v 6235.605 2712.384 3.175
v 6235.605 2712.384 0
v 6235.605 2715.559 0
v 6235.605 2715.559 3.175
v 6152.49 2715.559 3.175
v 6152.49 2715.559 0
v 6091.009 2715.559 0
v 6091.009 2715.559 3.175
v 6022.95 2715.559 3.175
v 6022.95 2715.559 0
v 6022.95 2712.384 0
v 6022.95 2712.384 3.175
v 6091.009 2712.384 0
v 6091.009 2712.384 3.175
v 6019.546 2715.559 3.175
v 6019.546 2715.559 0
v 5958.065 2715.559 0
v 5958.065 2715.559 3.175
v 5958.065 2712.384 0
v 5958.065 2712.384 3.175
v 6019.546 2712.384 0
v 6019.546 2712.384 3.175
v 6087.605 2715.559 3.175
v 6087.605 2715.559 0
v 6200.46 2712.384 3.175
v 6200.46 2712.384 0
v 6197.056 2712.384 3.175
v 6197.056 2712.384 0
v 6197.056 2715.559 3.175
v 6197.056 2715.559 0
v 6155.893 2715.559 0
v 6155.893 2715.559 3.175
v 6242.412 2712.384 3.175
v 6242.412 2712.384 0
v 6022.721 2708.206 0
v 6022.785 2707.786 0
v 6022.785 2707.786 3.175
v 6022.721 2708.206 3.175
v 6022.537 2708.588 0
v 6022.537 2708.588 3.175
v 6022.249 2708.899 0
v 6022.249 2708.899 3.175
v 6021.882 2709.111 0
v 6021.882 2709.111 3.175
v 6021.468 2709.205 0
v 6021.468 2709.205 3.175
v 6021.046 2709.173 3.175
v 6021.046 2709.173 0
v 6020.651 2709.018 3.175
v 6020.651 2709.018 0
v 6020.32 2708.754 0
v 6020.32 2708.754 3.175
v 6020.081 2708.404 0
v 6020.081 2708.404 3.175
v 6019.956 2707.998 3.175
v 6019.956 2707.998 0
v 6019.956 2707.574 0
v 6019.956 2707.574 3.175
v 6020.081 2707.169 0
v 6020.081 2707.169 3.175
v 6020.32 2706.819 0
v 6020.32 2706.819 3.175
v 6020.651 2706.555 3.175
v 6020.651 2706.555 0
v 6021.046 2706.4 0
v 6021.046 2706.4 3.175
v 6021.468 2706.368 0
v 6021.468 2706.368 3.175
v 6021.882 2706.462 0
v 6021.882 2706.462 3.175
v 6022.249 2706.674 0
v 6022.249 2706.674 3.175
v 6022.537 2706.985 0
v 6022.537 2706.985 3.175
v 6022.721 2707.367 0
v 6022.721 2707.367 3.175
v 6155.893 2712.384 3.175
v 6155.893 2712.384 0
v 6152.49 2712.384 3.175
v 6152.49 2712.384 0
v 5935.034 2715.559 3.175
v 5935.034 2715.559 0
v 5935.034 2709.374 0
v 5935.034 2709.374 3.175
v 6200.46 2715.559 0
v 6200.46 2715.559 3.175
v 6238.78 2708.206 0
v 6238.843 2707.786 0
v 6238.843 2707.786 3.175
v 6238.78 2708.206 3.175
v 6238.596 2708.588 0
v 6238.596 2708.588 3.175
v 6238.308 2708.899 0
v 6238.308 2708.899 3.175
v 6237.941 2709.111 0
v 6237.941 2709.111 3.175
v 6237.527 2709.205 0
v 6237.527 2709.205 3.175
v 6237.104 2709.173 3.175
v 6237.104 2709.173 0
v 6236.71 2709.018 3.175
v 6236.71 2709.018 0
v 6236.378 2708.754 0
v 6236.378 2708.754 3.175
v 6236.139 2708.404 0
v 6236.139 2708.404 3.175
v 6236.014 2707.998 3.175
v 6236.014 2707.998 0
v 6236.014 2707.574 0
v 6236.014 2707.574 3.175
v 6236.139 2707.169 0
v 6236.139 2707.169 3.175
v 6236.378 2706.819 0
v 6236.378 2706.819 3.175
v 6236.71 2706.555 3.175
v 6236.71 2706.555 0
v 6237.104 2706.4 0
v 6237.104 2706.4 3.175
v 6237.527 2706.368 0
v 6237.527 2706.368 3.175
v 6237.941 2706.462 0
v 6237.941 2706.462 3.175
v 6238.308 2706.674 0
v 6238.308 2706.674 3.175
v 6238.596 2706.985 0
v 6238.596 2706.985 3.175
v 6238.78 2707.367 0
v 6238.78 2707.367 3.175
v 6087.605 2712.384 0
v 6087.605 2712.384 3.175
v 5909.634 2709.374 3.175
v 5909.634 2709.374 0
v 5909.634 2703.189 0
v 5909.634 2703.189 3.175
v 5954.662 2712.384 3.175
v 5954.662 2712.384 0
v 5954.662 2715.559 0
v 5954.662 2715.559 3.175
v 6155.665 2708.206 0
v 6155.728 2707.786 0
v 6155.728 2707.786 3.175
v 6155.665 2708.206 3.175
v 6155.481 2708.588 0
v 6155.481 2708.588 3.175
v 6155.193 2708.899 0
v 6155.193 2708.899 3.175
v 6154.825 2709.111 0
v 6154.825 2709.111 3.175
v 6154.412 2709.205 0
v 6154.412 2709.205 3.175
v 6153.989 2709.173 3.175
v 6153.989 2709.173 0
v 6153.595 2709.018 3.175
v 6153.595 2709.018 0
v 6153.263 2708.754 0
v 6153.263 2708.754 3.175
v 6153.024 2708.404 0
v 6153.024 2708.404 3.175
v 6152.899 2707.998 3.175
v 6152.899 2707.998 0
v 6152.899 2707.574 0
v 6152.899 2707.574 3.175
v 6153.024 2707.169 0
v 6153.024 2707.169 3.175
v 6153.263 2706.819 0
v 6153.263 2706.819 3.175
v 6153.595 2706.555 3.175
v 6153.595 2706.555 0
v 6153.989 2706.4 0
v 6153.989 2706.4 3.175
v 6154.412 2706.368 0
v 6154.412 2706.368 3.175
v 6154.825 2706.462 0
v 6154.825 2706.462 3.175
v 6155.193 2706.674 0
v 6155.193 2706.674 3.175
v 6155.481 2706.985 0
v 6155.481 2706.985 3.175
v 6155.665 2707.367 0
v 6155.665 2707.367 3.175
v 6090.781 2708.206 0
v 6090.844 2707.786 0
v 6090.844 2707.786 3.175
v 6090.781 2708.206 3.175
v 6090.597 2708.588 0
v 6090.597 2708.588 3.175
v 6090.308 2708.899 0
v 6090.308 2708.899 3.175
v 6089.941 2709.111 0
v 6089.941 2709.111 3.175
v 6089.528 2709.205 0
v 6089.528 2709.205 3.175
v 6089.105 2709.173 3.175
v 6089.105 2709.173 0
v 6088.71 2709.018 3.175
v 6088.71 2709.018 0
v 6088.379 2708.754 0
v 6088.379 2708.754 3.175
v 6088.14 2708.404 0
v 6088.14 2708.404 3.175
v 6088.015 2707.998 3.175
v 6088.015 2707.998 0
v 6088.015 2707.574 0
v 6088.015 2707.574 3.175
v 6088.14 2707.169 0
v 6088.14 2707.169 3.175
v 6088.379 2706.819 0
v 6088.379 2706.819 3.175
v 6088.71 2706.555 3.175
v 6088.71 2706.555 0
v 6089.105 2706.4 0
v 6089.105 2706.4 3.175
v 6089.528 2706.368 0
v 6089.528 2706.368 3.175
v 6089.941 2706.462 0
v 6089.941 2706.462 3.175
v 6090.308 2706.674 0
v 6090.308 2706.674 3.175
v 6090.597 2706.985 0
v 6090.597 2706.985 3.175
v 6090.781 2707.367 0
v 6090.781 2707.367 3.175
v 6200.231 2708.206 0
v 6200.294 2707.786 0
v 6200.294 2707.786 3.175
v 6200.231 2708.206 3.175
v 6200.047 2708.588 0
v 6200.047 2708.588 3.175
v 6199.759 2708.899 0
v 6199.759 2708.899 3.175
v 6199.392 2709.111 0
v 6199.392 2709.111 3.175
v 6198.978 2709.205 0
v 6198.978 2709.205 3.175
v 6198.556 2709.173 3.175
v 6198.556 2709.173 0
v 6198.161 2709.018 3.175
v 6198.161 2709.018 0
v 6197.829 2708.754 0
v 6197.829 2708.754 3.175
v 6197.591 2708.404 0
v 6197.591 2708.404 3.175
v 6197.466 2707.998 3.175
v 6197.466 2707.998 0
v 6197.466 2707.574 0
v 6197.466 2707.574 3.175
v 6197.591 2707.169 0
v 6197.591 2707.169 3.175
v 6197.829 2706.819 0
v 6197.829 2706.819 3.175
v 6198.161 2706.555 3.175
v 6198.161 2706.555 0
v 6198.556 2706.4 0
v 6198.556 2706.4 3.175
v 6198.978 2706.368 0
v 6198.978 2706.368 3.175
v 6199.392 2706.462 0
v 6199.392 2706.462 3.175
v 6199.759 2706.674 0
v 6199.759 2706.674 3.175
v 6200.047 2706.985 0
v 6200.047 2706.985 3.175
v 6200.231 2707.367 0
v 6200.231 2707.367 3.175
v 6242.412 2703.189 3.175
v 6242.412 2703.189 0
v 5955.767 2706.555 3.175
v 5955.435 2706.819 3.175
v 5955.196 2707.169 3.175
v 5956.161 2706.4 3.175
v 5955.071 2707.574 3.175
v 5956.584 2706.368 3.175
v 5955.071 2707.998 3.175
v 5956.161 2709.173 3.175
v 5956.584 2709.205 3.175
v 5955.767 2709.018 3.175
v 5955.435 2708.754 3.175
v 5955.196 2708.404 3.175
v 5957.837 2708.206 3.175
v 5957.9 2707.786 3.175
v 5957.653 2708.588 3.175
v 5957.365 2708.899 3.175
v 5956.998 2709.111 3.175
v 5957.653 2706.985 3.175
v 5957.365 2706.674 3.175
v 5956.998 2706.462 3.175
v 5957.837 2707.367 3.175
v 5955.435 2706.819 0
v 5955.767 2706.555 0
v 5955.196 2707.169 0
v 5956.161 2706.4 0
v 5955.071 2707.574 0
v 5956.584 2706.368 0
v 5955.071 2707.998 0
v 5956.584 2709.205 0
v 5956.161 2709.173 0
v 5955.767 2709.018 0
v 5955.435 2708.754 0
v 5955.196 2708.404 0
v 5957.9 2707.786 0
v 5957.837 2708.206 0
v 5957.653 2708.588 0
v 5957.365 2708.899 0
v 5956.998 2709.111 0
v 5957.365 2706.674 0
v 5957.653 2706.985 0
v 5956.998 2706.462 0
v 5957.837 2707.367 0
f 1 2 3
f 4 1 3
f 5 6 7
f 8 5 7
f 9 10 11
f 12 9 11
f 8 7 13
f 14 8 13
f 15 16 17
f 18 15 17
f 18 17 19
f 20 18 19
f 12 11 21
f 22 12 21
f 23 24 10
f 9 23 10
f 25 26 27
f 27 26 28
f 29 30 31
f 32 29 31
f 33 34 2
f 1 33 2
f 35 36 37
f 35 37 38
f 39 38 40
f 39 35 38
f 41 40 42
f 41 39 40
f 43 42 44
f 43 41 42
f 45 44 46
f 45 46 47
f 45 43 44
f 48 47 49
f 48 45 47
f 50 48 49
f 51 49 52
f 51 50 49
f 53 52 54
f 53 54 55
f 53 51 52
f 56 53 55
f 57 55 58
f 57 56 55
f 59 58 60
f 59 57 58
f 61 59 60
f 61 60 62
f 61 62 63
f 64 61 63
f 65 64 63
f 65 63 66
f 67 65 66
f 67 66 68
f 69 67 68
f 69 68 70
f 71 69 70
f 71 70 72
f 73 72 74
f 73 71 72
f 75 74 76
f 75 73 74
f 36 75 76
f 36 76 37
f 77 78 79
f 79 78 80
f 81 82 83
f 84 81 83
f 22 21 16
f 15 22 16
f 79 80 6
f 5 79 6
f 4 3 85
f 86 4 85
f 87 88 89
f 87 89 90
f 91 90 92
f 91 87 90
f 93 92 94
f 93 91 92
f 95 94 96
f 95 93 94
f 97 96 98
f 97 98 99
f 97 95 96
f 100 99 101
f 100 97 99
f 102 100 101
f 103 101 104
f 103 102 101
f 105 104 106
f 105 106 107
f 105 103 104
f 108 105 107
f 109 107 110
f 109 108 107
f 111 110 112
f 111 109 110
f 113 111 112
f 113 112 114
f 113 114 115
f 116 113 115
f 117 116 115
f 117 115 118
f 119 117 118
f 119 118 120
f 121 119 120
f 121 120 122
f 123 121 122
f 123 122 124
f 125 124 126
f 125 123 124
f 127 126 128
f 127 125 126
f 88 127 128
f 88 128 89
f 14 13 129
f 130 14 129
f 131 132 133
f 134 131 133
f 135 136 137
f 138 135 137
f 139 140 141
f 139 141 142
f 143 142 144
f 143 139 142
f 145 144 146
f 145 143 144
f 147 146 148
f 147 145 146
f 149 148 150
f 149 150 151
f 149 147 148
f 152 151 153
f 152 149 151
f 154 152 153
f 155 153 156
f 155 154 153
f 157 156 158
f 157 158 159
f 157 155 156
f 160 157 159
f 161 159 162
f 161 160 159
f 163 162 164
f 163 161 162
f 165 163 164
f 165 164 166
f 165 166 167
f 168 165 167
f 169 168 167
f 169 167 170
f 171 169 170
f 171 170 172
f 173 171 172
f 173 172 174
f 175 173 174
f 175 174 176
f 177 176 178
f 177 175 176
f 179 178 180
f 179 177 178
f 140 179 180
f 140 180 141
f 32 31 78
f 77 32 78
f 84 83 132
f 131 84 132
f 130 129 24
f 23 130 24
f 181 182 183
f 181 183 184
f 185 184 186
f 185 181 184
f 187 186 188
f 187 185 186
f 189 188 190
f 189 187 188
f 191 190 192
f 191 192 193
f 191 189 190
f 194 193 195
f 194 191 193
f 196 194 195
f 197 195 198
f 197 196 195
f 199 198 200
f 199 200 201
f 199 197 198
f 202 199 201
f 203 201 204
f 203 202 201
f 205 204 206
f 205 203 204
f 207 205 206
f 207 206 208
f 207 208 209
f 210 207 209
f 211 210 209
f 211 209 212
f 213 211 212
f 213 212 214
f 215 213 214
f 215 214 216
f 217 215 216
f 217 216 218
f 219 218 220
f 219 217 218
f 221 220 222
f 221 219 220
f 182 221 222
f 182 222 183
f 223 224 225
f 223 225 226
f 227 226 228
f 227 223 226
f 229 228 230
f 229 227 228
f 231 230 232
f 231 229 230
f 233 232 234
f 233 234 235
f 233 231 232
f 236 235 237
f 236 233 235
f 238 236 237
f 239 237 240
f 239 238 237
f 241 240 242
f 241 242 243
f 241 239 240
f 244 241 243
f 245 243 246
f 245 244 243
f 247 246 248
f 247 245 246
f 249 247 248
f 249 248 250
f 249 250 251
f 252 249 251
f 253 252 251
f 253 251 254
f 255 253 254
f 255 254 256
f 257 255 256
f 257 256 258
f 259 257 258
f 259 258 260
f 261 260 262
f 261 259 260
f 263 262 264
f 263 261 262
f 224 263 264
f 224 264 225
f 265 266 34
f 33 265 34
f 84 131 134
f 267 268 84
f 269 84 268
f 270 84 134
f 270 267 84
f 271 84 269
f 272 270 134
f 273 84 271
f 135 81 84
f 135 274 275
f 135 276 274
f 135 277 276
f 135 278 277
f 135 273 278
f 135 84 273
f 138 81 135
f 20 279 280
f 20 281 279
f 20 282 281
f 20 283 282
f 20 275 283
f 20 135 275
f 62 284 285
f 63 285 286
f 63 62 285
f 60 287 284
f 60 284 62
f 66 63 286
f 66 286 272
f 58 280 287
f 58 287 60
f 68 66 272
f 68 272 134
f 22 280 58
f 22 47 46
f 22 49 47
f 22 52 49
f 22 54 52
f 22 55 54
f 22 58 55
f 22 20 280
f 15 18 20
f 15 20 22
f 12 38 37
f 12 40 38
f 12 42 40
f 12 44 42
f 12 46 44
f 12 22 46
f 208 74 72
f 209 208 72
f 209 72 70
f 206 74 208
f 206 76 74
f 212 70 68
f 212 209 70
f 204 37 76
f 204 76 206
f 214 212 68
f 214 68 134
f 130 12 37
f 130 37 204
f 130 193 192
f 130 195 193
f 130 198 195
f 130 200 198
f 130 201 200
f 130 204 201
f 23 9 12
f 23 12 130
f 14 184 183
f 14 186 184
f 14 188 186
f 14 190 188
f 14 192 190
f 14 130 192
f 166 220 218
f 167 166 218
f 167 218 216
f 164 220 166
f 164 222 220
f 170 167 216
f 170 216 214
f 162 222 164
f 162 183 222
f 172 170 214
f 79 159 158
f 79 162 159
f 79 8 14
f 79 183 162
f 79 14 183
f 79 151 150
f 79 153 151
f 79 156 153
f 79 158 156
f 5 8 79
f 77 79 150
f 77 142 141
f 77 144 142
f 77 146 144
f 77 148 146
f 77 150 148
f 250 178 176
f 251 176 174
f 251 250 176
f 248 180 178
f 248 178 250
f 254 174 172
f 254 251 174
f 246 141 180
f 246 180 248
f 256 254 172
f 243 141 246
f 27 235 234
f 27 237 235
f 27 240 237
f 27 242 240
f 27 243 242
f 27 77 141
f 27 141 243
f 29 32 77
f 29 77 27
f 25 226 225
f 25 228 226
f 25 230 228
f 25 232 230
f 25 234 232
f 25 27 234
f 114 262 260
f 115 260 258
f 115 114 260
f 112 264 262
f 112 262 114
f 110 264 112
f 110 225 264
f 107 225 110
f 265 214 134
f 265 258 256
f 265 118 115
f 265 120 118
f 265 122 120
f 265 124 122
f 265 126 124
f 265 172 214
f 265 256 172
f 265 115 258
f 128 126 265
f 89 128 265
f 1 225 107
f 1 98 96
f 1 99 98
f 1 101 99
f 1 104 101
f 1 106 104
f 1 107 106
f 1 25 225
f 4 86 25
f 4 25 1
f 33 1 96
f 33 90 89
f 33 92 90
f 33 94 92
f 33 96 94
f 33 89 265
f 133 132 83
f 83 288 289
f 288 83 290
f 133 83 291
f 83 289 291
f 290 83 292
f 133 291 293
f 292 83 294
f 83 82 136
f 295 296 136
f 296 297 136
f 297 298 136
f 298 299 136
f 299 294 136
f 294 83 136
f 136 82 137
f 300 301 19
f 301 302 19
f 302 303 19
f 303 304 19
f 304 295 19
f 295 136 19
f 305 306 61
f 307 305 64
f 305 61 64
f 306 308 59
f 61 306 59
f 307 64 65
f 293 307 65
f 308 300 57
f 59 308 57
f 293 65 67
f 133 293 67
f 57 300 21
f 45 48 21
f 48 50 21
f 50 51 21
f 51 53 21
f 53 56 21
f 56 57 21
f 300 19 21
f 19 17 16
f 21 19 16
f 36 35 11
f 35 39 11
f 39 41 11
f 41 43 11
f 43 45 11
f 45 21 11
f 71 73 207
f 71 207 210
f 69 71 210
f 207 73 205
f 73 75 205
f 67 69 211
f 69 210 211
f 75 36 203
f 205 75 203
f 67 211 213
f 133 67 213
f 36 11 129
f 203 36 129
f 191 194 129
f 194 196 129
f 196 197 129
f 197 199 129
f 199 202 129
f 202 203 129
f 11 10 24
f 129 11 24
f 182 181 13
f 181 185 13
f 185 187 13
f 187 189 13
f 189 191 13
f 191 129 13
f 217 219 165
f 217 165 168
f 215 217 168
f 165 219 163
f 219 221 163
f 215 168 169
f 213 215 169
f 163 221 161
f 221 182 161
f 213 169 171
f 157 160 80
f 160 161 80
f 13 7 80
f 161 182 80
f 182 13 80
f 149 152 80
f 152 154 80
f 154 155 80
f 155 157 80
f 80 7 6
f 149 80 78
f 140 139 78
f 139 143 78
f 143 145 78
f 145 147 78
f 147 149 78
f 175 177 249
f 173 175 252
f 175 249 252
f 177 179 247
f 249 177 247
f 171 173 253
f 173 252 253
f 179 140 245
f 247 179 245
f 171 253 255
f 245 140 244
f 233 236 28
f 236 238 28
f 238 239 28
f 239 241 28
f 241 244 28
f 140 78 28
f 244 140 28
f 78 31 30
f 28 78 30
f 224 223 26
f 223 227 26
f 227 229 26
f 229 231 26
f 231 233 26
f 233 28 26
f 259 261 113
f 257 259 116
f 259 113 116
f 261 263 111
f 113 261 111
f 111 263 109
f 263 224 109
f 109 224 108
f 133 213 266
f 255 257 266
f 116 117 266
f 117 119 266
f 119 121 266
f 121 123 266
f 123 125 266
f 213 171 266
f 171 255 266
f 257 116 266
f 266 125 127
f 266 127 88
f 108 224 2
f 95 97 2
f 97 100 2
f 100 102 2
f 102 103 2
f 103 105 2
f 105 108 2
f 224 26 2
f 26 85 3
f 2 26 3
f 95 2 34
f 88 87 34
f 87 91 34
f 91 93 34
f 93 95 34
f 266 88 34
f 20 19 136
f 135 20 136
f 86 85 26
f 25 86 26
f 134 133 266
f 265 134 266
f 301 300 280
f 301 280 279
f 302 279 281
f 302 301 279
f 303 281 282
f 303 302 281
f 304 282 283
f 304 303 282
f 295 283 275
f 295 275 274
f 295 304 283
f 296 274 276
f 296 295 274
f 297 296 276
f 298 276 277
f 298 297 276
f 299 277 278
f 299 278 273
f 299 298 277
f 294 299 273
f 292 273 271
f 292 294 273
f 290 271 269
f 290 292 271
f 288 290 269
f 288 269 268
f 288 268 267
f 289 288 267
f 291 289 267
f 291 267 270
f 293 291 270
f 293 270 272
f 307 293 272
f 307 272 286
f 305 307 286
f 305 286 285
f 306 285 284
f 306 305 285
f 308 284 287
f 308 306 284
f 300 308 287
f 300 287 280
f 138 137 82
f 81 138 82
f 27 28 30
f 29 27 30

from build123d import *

# Parameters (mm, degrees)
SKETCH1_R           = 1.4224
BOSS_EXTRUDE1_DEPTH = 3.175


with BuildPart() as part:
    # Sketch1 → Boss-Extrude1 (new body)
    with BuildSketch(Plane.XY):
        Polygon((6235.604848961, 2712.383832202), (6235.604848961, 2715.558832202), (6200.459551877, 2715.558832202), (6200.459551877, 2712.383832202), (6197.055951877, 2712.383832202), (6197.055951877, 2715.558832202), (6155.893298961, 2715.558832202), (6155.893298961, 2712.383832202), (6152.489698961, 2712.383832202), (6152.489698961, 2715.558832202), (6091.008998961, 2715.558832202), (6091.008998961, 2712.383832202), (6087.605398961, 2712.383832202), (6087.605398961, 2715.558832202), (6022.949698961, 2715.558832202), (6022.949698961, 2712.383832202), (6019.546098961, 2712.383832202), (6019.546098961, 2715.558832202), (5958.065398961, 2715.558832202), (5958.065398961, 2712.383832202), (5954.661798961, 2712.383832202), (5954.661798961, 2715.558832202), (5935.033948961, 2715.558832202), (5935.033948961, 2709.373932202), (5909.633948961, 2709.373932202), (5909.633948961, 2703.189032202), (6242.412048961, 2703.189032202), (6242.412048961, 2712.383832202), align=None)
        with Locations((5956.477898961, 2707.786432202)):
            Circle(SKETCH1_R, mode=Mode.SUBTRACT)
        with Locations((6021.362198961, 2707.786432202)):
            Circle(SKETCH1_R, mode=Mode.SUBTRACT)
        with Locations((6089.421498961, 2707.786432202)):
            Circle(SKETCH1_R, mode=Mode.SUBTRACT)
        with Locations((6154.305798961, 2707.786432202)):
            Circle(SKETCH1_R, mode=Mode.SUBTRACT)
        with Locations((6198.872051877, 2707.786432202)):
            Circle(SKETCH1_R, mode=Mode.SUBTRACT)
        with Locations((6237.420948961, 2707.786432202)):
            Circle(SKETCH1_R, mode=Mode.SUBTRACT)
    extrude(amount=BOSS_EXTRUDE1_DEPTH)


solid = part.part
